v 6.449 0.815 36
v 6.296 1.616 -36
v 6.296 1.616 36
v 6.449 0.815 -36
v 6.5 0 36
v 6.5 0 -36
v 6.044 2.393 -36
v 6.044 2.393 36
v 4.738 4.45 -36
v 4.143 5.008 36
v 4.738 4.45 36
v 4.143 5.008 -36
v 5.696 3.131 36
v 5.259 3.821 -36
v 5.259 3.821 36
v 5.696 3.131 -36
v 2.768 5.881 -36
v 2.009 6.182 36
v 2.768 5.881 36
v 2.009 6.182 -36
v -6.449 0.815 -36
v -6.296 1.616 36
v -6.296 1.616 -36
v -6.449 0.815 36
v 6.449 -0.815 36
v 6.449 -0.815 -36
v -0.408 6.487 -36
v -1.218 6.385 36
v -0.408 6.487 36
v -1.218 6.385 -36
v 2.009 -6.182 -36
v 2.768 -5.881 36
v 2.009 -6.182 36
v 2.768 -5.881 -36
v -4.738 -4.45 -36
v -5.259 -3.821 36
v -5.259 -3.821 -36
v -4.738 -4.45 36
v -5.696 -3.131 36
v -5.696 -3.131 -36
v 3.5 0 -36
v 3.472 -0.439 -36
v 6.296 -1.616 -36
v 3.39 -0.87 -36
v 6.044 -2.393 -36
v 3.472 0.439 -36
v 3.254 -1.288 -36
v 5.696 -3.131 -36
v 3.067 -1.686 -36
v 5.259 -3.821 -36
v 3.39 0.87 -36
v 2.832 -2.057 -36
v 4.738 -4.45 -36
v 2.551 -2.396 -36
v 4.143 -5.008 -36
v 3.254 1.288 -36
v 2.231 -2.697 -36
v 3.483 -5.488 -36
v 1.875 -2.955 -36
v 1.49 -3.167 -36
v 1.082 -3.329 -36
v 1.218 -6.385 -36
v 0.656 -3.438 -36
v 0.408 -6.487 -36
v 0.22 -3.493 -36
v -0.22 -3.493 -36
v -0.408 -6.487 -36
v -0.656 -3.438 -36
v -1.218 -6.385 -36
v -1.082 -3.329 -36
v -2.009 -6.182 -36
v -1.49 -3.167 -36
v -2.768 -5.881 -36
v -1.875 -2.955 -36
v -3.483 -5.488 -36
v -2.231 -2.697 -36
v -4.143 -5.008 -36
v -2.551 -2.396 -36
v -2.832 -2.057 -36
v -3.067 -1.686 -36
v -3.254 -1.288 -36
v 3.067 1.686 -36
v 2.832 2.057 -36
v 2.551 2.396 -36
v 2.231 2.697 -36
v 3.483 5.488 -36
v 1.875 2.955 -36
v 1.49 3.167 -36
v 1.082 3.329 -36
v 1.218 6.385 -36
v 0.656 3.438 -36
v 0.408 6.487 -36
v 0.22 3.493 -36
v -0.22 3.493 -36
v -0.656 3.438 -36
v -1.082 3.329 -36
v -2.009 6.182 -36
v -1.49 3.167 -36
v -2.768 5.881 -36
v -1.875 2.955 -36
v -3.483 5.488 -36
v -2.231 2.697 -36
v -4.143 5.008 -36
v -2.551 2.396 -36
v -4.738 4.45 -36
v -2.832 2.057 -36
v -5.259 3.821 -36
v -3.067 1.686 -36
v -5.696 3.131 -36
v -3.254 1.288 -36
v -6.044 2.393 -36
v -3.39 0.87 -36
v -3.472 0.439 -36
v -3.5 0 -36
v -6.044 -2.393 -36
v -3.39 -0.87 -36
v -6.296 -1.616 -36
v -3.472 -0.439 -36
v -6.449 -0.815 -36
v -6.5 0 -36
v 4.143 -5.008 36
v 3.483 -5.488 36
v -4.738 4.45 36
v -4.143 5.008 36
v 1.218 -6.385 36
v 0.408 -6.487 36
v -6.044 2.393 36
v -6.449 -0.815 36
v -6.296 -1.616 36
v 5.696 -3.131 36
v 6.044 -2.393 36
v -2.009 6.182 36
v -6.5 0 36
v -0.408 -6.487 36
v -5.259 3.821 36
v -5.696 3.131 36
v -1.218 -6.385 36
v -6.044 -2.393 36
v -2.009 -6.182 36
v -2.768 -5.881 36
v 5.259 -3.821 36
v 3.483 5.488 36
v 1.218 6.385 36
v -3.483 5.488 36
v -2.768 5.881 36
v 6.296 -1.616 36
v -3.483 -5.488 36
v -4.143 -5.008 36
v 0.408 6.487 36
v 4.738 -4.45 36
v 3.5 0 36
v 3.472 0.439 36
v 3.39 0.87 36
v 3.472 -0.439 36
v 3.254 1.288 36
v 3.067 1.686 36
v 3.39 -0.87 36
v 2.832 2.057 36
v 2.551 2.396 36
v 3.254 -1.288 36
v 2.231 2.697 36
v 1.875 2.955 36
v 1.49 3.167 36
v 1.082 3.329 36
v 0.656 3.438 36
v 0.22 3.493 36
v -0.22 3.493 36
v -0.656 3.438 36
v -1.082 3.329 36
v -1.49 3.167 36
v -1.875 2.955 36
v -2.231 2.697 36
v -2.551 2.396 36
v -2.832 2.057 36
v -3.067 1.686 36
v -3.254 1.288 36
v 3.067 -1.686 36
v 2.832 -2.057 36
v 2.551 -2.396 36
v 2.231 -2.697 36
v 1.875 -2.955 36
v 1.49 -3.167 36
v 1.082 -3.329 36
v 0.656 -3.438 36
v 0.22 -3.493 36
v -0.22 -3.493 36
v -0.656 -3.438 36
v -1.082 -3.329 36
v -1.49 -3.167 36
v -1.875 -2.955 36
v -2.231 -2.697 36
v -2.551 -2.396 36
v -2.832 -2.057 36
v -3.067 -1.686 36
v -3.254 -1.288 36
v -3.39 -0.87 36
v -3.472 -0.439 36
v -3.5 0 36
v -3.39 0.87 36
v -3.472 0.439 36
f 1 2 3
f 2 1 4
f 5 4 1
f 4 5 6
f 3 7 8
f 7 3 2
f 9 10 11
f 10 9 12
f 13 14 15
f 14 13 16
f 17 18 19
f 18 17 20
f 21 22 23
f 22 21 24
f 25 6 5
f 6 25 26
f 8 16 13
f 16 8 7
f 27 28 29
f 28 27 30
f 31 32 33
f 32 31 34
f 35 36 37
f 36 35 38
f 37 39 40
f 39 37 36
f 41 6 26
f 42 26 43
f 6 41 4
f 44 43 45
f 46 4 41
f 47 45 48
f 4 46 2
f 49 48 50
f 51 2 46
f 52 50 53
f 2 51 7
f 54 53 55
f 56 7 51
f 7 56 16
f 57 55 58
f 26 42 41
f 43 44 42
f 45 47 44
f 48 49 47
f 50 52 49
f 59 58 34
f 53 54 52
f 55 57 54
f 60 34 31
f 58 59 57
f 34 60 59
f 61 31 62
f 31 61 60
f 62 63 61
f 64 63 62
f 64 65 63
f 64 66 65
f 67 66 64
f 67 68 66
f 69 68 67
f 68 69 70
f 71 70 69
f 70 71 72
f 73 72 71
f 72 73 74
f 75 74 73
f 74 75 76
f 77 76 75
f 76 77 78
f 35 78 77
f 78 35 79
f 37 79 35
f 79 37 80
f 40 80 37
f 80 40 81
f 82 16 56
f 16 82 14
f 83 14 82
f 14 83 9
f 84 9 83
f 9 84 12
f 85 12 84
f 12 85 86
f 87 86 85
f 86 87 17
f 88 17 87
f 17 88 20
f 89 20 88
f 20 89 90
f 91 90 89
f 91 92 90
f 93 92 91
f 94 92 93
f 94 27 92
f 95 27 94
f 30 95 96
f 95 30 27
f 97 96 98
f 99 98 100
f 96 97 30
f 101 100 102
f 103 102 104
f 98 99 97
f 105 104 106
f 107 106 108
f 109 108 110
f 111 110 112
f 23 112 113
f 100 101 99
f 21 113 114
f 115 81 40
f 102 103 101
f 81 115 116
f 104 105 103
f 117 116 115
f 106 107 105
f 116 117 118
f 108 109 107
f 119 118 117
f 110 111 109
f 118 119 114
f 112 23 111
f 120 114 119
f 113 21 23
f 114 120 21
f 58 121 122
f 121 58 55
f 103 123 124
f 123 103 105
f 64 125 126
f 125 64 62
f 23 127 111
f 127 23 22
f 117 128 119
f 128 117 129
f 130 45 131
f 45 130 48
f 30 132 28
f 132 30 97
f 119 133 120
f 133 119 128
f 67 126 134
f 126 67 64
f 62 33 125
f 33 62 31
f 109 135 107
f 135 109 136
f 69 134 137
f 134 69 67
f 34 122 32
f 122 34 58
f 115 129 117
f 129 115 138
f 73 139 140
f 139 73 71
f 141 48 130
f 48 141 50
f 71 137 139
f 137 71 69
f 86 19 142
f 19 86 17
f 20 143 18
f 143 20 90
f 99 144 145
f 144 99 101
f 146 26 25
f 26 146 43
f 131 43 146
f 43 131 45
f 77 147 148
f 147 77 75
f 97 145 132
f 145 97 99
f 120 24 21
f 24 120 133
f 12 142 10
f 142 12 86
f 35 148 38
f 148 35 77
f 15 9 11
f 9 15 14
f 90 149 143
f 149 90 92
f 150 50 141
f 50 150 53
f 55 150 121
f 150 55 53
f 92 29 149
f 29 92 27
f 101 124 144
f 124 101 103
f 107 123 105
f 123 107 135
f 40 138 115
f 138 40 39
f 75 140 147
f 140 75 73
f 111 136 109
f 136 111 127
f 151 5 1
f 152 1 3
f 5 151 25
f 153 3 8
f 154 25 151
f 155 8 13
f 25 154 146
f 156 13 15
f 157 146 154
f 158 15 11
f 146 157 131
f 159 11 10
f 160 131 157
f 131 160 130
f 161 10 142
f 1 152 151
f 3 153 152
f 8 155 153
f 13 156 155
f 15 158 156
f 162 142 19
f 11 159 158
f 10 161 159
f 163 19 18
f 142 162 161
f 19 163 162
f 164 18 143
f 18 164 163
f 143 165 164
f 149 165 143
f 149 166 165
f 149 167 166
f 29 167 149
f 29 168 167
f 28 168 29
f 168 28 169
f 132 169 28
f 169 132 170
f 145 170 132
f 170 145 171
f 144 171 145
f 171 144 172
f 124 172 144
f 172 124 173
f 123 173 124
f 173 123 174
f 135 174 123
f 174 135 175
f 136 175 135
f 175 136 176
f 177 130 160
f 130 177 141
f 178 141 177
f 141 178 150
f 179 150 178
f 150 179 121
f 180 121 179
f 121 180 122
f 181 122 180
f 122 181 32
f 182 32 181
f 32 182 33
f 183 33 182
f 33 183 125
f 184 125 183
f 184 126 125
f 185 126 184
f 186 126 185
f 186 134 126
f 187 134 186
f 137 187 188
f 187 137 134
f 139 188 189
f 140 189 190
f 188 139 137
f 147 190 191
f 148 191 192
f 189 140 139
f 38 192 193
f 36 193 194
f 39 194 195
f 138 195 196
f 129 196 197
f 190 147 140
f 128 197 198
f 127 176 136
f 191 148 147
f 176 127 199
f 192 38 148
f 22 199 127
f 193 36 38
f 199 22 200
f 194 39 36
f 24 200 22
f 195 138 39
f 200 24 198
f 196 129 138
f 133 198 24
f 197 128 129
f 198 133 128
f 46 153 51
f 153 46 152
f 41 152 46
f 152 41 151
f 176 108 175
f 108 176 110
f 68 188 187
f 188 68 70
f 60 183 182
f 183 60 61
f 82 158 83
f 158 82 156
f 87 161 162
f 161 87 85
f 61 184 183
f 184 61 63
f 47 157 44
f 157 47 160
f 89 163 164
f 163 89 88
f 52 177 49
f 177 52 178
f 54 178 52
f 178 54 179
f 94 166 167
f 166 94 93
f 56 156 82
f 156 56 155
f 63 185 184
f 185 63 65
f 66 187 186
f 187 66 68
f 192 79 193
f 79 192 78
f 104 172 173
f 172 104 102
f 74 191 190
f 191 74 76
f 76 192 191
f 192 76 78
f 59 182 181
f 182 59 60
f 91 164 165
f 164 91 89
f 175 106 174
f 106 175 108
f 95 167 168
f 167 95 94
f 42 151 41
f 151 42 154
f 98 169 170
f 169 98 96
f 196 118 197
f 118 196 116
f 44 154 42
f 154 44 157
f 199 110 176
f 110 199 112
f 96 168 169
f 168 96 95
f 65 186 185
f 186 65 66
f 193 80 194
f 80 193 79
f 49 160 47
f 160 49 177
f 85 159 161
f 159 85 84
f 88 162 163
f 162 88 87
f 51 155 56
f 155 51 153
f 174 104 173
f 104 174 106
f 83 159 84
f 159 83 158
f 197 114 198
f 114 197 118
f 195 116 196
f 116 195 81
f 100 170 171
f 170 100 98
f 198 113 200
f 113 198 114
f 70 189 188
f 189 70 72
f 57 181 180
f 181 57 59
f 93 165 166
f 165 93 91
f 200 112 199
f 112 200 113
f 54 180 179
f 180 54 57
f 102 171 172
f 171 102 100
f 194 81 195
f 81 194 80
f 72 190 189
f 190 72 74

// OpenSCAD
$fn = 50;


difference() {
	union() {
		translate(v = [0, 0, -36.0000000000]) {
			cylinder(h = 72, r = 6.5000000000);
		}
	}
	union() {
		translate(v = [0, 0, -100.0000000000]) {
			cylinder(h = 200, r = 3.5000000000);
		}
	}
}
